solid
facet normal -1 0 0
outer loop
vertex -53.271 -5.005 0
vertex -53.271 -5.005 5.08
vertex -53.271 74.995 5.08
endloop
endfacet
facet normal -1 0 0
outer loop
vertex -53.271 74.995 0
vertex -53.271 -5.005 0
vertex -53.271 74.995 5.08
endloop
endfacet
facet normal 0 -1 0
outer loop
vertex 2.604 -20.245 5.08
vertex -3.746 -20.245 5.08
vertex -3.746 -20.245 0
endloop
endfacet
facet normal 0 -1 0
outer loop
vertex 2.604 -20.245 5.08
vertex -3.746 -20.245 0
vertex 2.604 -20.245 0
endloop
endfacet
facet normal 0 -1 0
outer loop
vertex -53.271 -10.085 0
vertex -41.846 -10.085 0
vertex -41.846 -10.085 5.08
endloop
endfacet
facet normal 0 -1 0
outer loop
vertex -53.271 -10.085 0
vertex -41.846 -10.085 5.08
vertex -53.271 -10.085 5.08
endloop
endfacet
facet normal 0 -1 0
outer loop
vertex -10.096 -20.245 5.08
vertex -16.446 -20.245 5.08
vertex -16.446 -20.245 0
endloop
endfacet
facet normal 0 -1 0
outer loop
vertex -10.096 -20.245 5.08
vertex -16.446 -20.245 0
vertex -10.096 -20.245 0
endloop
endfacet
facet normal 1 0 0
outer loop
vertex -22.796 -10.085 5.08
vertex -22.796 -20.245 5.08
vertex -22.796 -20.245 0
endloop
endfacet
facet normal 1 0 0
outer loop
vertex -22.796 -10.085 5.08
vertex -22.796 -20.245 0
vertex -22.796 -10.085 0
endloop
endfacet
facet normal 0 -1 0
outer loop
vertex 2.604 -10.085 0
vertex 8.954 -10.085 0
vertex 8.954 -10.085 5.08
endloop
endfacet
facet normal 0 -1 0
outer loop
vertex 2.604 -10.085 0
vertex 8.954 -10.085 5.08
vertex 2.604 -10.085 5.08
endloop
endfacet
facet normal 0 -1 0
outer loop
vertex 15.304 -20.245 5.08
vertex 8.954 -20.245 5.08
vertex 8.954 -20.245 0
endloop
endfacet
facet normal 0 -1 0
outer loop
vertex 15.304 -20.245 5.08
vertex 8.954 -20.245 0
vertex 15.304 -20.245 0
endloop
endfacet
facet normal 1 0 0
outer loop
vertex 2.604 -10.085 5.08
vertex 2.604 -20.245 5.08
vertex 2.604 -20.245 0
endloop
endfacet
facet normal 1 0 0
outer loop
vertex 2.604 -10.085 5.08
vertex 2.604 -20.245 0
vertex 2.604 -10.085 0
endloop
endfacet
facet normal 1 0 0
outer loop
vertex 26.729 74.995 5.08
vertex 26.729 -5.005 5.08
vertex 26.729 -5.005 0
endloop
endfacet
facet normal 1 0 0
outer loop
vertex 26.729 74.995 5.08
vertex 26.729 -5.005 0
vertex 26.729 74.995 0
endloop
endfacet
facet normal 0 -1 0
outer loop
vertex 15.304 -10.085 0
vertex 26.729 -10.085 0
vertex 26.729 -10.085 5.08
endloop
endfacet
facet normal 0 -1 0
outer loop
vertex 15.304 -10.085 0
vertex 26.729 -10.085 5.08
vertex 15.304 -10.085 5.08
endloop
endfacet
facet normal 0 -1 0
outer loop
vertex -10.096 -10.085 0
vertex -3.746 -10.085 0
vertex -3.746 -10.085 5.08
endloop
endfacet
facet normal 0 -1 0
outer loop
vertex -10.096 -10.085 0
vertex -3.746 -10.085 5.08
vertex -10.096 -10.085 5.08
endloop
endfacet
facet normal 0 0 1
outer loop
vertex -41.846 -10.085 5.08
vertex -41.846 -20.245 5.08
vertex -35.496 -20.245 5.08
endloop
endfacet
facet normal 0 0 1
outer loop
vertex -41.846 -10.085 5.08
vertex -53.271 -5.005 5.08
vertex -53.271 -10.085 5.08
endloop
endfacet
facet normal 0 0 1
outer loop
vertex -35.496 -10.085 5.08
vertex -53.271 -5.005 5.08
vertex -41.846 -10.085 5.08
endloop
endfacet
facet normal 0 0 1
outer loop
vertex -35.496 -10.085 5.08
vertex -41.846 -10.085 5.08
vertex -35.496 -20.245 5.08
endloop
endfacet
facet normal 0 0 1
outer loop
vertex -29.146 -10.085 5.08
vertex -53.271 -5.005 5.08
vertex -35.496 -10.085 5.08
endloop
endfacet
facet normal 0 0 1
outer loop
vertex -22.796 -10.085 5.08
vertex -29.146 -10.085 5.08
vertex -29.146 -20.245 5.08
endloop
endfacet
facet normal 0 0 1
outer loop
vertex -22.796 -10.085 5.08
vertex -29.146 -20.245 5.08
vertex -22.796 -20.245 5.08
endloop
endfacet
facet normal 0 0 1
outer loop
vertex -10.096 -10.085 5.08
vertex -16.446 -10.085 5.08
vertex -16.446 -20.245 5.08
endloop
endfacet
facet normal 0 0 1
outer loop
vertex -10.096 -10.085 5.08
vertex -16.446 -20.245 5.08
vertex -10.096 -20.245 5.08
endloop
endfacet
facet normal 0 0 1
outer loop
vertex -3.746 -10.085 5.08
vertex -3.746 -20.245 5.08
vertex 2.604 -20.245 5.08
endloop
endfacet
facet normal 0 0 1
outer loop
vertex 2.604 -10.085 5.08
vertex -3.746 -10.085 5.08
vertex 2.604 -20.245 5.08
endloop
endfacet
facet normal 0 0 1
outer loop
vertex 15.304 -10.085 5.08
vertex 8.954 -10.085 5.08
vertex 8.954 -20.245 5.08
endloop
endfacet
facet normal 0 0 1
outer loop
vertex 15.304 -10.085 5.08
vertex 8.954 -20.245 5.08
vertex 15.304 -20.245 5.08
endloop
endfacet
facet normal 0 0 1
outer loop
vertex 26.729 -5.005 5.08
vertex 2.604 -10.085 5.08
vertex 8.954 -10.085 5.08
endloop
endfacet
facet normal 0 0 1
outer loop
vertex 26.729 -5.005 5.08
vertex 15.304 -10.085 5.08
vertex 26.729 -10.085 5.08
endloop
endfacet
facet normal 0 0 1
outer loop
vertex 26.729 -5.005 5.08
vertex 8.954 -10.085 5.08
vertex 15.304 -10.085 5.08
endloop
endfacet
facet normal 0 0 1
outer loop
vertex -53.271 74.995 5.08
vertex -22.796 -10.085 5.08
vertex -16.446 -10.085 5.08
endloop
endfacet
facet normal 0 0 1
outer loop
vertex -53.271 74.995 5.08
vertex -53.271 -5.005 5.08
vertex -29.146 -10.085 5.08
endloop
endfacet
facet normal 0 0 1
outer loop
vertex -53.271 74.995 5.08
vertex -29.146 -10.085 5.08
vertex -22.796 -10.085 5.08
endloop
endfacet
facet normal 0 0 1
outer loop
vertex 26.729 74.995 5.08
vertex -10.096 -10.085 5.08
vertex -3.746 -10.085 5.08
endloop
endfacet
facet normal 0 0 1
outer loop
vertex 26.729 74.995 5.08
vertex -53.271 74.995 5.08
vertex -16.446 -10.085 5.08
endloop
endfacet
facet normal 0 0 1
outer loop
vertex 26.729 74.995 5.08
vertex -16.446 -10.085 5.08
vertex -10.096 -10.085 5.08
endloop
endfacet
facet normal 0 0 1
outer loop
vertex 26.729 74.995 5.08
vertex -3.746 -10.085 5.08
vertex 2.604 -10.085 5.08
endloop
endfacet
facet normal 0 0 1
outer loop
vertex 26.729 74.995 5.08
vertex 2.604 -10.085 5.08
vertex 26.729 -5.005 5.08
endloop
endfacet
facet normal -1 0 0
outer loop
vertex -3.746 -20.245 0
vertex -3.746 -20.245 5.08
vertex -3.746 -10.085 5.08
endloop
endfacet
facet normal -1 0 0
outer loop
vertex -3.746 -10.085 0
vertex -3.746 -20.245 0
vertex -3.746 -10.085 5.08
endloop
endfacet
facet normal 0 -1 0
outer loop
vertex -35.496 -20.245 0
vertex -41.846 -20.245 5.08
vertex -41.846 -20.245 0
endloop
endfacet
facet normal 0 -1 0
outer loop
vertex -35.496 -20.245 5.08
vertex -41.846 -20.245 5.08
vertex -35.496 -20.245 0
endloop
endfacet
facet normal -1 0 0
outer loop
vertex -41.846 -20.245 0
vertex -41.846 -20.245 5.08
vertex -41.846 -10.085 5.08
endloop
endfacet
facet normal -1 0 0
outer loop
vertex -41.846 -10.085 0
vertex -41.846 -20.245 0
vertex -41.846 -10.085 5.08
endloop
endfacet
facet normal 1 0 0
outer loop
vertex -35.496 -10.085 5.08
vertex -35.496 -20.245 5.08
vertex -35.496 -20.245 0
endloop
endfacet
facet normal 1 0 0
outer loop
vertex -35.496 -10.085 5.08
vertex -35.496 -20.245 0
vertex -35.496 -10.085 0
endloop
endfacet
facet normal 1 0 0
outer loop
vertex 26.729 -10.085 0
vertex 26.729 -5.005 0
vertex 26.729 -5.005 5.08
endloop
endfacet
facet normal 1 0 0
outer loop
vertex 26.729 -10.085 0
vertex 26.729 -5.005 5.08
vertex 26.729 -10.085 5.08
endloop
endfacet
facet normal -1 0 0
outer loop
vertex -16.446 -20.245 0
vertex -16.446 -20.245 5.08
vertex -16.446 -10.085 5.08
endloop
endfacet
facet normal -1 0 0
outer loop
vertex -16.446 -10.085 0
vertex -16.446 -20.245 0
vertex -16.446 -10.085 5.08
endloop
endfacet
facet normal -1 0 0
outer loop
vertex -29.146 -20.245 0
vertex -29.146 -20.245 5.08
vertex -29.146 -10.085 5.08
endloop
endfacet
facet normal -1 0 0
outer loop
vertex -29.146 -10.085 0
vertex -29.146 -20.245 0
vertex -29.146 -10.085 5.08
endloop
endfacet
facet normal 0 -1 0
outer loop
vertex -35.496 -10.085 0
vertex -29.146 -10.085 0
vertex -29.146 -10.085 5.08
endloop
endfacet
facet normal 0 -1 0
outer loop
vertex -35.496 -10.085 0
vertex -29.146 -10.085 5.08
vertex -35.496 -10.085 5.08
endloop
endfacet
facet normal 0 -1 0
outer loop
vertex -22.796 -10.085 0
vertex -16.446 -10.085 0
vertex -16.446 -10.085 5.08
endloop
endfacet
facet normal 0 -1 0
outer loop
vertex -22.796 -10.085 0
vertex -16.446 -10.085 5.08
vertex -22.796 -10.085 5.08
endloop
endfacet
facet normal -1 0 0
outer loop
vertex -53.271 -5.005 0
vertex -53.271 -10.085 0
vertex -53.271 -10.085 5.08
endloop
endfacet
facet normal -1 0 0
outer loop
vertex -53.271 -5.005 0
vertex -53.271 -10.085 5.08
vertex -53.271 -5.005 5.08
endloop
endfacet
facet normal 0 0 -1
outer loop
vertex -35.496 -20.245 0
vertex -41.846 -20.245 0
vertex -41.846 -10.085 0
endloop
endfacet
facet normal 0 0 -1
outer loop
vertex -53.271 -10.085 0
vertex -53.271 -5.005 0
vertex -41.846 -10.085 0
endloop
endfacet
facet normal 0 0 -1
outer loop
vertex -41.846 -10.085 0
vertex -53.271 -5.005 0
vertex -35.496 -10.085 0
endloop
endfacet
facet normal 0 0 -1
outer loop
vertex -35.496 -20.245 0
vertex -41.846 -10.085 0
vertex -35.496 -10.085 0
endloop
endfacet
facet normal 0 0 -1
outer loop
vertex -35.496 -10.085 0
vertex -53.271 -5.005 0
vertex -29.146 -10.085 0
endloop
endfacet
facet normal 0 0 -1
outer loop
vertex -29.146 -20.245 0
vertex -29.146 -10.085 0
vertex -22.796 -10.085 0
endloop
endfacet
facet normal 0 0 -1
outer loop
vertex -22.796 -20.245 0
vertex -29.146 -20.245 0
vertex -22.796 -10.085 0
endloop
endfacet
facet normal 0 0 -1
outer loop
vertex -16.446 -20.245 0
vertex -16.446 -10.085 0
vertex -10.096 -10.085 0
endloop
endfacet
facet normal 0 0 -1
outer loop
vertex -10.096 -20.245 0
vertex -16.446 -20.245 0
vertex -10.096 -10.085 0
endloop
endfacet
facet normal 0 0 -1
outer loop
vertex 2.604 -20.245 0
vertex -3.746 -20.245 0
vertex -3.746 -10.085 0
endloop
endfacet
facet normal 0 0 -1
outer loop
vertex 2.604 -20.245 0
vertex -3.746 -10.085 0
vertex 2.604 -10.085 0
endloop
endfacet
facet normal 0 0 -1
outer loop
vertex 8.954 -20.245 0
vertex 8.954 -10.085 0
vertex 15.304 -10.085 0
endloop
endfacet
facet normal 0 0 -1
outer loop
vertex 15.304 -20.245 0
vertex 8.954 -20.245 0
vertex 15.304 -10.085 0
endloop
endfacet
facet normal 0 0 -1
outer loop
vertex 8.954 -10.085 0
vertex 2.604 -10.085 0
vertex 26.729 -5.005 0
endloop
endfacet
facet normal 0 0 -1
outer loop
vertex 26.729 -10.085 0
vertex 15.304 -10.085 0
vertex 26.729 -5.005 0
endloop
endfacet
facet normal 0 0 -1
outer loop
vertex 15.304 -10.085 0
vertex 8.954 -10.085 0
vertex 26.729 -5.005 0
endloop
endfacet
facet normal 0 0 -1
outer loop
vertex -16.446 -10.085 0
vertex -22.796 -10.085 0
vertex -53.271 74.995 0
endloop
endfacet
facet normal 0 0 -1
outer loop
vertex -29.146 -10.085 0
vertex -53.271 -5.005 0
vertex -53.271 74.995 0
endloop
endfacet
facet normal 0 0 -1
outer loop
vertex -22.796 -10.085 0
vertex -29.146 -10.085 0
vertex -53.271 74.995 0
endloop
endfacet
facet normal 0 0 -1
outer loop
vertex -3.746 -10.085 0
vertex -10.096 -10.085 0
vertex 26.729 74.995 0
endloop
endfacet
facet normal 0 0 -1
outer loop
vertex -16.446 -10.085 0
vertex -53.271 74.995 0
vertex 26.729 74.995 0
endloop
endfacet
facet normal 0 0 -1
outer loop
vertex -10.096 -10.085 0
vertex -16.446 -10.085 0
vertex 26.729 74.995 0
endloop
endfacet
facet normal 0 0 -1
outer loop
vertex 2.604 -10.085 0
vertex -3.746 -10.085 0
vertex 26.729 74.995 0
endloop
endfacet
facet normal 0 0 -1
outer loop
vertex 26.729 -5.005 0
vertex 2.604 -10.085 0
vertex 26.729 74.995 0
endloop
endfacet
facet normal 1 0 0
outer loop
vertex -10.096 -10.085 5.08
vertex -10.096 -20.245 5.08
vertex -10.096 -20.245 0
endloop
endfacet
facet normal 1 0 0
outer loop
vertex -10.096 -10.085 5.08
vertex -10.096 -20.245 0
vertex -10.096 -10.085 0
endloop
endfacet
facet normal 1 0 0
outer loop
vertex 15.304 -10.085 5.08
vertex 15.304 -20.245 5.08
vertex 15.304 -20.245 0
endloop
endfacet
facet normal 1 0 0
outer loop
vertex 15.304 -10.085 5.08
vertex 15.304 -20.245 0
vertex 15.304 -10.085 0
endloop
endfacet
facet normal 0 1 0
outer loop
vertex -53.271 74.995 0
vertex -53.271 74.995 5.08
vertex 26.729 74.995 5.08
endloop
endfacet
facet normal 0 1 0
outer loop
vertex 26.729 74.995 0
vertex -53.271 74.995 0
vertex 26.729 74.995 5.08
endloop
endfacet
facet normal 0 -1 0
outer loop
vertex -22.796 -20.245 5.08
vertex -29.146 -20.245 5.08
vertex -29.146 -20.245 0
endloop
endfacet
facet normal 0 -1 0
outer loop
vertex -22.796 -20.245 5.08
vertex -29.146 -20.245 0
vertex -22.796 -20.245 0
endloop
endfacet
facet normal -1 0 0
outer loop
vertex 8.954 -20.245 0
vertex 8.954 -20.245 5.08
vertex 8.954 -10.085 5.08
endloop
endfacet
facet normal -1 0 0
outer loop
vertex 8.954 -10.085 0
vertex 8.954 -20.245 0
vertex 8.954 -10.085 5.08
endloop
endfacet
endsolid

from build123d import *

# Parameters (mm, degrees)
BOSS_EXTRUDE1_DEPTH = 5.08
SKETCH2_W           = 6.35
SKETCH2_H           = 10.16
SKETCH2_W_2         = 3.175
BOSS_EXTRUDE2_DEPTH = 5.08
SKETCH3_W           = 80
SKETCH3_H           = 80
BOSS_EXTRUDE3_DEPTH = 5.08


with BuildPart() as part:
    # Sketch1 → Boss-Extrude1 (new body)
    with BuildSketch(Plane.XY):
        Polygon((-32.320960724, -5.005294118), (-32.320960724, 34.994705882), (5.779039276, 34.994705882), (5.779039276, -5.005294118), (26.728959276, -5.005294118), (26.728959276, -10.085294118), (-53.271040724, -10.085294118), (-53.271040724, -5.005294118), align=None)
    extrude(amount=BOSS_EXTRUDE1_DEPTH)

    # Sketch2 → Boss-Extrude2 (add)
    with BuildSketch(Plane.XY.offset(5.08)):
        with Locations((-38.670960724, -15.165294118)):
            Rectangle(SKETCH2_W, SKETCH2_H)
        with Locations((-25.970960724, -15.165294118)):
            Rectangle(SKETCH2_W, SKETCH2_H)
        with Locations((-14.858460724, -15.165294118)):
            Rectangle(SKETCH2_W_2, SKETCH2_H)
        with Locations((-11.683460724, -15.165294118)):
            Rectangle(SKETCH2_W_2, SKETCH2_H)
        with Locations((-0.570960724, -15.165294118)):
            Rectangle(SKETCH2_W, SKETCH2_H)
        with Locations((12.129039276, -15.165294118)):
            Rectangle(SKETCH2_W, SKETCH2_H)
    extrude(amount=-BOSS_EXTRUDE2_DEPTH)

    # Sketch3 → Boss-Extrude3 (add)
    with BuildSketch(Plane.XY.offset(5.08)):
        with Locations((-13.270960724, 34.994705882)):
            Rectangle(SKETCH3_W, SKETCH3_H)
    extrude(amount=-BOSS_EXTRUDE3_DEPTH)


solid = part.part
